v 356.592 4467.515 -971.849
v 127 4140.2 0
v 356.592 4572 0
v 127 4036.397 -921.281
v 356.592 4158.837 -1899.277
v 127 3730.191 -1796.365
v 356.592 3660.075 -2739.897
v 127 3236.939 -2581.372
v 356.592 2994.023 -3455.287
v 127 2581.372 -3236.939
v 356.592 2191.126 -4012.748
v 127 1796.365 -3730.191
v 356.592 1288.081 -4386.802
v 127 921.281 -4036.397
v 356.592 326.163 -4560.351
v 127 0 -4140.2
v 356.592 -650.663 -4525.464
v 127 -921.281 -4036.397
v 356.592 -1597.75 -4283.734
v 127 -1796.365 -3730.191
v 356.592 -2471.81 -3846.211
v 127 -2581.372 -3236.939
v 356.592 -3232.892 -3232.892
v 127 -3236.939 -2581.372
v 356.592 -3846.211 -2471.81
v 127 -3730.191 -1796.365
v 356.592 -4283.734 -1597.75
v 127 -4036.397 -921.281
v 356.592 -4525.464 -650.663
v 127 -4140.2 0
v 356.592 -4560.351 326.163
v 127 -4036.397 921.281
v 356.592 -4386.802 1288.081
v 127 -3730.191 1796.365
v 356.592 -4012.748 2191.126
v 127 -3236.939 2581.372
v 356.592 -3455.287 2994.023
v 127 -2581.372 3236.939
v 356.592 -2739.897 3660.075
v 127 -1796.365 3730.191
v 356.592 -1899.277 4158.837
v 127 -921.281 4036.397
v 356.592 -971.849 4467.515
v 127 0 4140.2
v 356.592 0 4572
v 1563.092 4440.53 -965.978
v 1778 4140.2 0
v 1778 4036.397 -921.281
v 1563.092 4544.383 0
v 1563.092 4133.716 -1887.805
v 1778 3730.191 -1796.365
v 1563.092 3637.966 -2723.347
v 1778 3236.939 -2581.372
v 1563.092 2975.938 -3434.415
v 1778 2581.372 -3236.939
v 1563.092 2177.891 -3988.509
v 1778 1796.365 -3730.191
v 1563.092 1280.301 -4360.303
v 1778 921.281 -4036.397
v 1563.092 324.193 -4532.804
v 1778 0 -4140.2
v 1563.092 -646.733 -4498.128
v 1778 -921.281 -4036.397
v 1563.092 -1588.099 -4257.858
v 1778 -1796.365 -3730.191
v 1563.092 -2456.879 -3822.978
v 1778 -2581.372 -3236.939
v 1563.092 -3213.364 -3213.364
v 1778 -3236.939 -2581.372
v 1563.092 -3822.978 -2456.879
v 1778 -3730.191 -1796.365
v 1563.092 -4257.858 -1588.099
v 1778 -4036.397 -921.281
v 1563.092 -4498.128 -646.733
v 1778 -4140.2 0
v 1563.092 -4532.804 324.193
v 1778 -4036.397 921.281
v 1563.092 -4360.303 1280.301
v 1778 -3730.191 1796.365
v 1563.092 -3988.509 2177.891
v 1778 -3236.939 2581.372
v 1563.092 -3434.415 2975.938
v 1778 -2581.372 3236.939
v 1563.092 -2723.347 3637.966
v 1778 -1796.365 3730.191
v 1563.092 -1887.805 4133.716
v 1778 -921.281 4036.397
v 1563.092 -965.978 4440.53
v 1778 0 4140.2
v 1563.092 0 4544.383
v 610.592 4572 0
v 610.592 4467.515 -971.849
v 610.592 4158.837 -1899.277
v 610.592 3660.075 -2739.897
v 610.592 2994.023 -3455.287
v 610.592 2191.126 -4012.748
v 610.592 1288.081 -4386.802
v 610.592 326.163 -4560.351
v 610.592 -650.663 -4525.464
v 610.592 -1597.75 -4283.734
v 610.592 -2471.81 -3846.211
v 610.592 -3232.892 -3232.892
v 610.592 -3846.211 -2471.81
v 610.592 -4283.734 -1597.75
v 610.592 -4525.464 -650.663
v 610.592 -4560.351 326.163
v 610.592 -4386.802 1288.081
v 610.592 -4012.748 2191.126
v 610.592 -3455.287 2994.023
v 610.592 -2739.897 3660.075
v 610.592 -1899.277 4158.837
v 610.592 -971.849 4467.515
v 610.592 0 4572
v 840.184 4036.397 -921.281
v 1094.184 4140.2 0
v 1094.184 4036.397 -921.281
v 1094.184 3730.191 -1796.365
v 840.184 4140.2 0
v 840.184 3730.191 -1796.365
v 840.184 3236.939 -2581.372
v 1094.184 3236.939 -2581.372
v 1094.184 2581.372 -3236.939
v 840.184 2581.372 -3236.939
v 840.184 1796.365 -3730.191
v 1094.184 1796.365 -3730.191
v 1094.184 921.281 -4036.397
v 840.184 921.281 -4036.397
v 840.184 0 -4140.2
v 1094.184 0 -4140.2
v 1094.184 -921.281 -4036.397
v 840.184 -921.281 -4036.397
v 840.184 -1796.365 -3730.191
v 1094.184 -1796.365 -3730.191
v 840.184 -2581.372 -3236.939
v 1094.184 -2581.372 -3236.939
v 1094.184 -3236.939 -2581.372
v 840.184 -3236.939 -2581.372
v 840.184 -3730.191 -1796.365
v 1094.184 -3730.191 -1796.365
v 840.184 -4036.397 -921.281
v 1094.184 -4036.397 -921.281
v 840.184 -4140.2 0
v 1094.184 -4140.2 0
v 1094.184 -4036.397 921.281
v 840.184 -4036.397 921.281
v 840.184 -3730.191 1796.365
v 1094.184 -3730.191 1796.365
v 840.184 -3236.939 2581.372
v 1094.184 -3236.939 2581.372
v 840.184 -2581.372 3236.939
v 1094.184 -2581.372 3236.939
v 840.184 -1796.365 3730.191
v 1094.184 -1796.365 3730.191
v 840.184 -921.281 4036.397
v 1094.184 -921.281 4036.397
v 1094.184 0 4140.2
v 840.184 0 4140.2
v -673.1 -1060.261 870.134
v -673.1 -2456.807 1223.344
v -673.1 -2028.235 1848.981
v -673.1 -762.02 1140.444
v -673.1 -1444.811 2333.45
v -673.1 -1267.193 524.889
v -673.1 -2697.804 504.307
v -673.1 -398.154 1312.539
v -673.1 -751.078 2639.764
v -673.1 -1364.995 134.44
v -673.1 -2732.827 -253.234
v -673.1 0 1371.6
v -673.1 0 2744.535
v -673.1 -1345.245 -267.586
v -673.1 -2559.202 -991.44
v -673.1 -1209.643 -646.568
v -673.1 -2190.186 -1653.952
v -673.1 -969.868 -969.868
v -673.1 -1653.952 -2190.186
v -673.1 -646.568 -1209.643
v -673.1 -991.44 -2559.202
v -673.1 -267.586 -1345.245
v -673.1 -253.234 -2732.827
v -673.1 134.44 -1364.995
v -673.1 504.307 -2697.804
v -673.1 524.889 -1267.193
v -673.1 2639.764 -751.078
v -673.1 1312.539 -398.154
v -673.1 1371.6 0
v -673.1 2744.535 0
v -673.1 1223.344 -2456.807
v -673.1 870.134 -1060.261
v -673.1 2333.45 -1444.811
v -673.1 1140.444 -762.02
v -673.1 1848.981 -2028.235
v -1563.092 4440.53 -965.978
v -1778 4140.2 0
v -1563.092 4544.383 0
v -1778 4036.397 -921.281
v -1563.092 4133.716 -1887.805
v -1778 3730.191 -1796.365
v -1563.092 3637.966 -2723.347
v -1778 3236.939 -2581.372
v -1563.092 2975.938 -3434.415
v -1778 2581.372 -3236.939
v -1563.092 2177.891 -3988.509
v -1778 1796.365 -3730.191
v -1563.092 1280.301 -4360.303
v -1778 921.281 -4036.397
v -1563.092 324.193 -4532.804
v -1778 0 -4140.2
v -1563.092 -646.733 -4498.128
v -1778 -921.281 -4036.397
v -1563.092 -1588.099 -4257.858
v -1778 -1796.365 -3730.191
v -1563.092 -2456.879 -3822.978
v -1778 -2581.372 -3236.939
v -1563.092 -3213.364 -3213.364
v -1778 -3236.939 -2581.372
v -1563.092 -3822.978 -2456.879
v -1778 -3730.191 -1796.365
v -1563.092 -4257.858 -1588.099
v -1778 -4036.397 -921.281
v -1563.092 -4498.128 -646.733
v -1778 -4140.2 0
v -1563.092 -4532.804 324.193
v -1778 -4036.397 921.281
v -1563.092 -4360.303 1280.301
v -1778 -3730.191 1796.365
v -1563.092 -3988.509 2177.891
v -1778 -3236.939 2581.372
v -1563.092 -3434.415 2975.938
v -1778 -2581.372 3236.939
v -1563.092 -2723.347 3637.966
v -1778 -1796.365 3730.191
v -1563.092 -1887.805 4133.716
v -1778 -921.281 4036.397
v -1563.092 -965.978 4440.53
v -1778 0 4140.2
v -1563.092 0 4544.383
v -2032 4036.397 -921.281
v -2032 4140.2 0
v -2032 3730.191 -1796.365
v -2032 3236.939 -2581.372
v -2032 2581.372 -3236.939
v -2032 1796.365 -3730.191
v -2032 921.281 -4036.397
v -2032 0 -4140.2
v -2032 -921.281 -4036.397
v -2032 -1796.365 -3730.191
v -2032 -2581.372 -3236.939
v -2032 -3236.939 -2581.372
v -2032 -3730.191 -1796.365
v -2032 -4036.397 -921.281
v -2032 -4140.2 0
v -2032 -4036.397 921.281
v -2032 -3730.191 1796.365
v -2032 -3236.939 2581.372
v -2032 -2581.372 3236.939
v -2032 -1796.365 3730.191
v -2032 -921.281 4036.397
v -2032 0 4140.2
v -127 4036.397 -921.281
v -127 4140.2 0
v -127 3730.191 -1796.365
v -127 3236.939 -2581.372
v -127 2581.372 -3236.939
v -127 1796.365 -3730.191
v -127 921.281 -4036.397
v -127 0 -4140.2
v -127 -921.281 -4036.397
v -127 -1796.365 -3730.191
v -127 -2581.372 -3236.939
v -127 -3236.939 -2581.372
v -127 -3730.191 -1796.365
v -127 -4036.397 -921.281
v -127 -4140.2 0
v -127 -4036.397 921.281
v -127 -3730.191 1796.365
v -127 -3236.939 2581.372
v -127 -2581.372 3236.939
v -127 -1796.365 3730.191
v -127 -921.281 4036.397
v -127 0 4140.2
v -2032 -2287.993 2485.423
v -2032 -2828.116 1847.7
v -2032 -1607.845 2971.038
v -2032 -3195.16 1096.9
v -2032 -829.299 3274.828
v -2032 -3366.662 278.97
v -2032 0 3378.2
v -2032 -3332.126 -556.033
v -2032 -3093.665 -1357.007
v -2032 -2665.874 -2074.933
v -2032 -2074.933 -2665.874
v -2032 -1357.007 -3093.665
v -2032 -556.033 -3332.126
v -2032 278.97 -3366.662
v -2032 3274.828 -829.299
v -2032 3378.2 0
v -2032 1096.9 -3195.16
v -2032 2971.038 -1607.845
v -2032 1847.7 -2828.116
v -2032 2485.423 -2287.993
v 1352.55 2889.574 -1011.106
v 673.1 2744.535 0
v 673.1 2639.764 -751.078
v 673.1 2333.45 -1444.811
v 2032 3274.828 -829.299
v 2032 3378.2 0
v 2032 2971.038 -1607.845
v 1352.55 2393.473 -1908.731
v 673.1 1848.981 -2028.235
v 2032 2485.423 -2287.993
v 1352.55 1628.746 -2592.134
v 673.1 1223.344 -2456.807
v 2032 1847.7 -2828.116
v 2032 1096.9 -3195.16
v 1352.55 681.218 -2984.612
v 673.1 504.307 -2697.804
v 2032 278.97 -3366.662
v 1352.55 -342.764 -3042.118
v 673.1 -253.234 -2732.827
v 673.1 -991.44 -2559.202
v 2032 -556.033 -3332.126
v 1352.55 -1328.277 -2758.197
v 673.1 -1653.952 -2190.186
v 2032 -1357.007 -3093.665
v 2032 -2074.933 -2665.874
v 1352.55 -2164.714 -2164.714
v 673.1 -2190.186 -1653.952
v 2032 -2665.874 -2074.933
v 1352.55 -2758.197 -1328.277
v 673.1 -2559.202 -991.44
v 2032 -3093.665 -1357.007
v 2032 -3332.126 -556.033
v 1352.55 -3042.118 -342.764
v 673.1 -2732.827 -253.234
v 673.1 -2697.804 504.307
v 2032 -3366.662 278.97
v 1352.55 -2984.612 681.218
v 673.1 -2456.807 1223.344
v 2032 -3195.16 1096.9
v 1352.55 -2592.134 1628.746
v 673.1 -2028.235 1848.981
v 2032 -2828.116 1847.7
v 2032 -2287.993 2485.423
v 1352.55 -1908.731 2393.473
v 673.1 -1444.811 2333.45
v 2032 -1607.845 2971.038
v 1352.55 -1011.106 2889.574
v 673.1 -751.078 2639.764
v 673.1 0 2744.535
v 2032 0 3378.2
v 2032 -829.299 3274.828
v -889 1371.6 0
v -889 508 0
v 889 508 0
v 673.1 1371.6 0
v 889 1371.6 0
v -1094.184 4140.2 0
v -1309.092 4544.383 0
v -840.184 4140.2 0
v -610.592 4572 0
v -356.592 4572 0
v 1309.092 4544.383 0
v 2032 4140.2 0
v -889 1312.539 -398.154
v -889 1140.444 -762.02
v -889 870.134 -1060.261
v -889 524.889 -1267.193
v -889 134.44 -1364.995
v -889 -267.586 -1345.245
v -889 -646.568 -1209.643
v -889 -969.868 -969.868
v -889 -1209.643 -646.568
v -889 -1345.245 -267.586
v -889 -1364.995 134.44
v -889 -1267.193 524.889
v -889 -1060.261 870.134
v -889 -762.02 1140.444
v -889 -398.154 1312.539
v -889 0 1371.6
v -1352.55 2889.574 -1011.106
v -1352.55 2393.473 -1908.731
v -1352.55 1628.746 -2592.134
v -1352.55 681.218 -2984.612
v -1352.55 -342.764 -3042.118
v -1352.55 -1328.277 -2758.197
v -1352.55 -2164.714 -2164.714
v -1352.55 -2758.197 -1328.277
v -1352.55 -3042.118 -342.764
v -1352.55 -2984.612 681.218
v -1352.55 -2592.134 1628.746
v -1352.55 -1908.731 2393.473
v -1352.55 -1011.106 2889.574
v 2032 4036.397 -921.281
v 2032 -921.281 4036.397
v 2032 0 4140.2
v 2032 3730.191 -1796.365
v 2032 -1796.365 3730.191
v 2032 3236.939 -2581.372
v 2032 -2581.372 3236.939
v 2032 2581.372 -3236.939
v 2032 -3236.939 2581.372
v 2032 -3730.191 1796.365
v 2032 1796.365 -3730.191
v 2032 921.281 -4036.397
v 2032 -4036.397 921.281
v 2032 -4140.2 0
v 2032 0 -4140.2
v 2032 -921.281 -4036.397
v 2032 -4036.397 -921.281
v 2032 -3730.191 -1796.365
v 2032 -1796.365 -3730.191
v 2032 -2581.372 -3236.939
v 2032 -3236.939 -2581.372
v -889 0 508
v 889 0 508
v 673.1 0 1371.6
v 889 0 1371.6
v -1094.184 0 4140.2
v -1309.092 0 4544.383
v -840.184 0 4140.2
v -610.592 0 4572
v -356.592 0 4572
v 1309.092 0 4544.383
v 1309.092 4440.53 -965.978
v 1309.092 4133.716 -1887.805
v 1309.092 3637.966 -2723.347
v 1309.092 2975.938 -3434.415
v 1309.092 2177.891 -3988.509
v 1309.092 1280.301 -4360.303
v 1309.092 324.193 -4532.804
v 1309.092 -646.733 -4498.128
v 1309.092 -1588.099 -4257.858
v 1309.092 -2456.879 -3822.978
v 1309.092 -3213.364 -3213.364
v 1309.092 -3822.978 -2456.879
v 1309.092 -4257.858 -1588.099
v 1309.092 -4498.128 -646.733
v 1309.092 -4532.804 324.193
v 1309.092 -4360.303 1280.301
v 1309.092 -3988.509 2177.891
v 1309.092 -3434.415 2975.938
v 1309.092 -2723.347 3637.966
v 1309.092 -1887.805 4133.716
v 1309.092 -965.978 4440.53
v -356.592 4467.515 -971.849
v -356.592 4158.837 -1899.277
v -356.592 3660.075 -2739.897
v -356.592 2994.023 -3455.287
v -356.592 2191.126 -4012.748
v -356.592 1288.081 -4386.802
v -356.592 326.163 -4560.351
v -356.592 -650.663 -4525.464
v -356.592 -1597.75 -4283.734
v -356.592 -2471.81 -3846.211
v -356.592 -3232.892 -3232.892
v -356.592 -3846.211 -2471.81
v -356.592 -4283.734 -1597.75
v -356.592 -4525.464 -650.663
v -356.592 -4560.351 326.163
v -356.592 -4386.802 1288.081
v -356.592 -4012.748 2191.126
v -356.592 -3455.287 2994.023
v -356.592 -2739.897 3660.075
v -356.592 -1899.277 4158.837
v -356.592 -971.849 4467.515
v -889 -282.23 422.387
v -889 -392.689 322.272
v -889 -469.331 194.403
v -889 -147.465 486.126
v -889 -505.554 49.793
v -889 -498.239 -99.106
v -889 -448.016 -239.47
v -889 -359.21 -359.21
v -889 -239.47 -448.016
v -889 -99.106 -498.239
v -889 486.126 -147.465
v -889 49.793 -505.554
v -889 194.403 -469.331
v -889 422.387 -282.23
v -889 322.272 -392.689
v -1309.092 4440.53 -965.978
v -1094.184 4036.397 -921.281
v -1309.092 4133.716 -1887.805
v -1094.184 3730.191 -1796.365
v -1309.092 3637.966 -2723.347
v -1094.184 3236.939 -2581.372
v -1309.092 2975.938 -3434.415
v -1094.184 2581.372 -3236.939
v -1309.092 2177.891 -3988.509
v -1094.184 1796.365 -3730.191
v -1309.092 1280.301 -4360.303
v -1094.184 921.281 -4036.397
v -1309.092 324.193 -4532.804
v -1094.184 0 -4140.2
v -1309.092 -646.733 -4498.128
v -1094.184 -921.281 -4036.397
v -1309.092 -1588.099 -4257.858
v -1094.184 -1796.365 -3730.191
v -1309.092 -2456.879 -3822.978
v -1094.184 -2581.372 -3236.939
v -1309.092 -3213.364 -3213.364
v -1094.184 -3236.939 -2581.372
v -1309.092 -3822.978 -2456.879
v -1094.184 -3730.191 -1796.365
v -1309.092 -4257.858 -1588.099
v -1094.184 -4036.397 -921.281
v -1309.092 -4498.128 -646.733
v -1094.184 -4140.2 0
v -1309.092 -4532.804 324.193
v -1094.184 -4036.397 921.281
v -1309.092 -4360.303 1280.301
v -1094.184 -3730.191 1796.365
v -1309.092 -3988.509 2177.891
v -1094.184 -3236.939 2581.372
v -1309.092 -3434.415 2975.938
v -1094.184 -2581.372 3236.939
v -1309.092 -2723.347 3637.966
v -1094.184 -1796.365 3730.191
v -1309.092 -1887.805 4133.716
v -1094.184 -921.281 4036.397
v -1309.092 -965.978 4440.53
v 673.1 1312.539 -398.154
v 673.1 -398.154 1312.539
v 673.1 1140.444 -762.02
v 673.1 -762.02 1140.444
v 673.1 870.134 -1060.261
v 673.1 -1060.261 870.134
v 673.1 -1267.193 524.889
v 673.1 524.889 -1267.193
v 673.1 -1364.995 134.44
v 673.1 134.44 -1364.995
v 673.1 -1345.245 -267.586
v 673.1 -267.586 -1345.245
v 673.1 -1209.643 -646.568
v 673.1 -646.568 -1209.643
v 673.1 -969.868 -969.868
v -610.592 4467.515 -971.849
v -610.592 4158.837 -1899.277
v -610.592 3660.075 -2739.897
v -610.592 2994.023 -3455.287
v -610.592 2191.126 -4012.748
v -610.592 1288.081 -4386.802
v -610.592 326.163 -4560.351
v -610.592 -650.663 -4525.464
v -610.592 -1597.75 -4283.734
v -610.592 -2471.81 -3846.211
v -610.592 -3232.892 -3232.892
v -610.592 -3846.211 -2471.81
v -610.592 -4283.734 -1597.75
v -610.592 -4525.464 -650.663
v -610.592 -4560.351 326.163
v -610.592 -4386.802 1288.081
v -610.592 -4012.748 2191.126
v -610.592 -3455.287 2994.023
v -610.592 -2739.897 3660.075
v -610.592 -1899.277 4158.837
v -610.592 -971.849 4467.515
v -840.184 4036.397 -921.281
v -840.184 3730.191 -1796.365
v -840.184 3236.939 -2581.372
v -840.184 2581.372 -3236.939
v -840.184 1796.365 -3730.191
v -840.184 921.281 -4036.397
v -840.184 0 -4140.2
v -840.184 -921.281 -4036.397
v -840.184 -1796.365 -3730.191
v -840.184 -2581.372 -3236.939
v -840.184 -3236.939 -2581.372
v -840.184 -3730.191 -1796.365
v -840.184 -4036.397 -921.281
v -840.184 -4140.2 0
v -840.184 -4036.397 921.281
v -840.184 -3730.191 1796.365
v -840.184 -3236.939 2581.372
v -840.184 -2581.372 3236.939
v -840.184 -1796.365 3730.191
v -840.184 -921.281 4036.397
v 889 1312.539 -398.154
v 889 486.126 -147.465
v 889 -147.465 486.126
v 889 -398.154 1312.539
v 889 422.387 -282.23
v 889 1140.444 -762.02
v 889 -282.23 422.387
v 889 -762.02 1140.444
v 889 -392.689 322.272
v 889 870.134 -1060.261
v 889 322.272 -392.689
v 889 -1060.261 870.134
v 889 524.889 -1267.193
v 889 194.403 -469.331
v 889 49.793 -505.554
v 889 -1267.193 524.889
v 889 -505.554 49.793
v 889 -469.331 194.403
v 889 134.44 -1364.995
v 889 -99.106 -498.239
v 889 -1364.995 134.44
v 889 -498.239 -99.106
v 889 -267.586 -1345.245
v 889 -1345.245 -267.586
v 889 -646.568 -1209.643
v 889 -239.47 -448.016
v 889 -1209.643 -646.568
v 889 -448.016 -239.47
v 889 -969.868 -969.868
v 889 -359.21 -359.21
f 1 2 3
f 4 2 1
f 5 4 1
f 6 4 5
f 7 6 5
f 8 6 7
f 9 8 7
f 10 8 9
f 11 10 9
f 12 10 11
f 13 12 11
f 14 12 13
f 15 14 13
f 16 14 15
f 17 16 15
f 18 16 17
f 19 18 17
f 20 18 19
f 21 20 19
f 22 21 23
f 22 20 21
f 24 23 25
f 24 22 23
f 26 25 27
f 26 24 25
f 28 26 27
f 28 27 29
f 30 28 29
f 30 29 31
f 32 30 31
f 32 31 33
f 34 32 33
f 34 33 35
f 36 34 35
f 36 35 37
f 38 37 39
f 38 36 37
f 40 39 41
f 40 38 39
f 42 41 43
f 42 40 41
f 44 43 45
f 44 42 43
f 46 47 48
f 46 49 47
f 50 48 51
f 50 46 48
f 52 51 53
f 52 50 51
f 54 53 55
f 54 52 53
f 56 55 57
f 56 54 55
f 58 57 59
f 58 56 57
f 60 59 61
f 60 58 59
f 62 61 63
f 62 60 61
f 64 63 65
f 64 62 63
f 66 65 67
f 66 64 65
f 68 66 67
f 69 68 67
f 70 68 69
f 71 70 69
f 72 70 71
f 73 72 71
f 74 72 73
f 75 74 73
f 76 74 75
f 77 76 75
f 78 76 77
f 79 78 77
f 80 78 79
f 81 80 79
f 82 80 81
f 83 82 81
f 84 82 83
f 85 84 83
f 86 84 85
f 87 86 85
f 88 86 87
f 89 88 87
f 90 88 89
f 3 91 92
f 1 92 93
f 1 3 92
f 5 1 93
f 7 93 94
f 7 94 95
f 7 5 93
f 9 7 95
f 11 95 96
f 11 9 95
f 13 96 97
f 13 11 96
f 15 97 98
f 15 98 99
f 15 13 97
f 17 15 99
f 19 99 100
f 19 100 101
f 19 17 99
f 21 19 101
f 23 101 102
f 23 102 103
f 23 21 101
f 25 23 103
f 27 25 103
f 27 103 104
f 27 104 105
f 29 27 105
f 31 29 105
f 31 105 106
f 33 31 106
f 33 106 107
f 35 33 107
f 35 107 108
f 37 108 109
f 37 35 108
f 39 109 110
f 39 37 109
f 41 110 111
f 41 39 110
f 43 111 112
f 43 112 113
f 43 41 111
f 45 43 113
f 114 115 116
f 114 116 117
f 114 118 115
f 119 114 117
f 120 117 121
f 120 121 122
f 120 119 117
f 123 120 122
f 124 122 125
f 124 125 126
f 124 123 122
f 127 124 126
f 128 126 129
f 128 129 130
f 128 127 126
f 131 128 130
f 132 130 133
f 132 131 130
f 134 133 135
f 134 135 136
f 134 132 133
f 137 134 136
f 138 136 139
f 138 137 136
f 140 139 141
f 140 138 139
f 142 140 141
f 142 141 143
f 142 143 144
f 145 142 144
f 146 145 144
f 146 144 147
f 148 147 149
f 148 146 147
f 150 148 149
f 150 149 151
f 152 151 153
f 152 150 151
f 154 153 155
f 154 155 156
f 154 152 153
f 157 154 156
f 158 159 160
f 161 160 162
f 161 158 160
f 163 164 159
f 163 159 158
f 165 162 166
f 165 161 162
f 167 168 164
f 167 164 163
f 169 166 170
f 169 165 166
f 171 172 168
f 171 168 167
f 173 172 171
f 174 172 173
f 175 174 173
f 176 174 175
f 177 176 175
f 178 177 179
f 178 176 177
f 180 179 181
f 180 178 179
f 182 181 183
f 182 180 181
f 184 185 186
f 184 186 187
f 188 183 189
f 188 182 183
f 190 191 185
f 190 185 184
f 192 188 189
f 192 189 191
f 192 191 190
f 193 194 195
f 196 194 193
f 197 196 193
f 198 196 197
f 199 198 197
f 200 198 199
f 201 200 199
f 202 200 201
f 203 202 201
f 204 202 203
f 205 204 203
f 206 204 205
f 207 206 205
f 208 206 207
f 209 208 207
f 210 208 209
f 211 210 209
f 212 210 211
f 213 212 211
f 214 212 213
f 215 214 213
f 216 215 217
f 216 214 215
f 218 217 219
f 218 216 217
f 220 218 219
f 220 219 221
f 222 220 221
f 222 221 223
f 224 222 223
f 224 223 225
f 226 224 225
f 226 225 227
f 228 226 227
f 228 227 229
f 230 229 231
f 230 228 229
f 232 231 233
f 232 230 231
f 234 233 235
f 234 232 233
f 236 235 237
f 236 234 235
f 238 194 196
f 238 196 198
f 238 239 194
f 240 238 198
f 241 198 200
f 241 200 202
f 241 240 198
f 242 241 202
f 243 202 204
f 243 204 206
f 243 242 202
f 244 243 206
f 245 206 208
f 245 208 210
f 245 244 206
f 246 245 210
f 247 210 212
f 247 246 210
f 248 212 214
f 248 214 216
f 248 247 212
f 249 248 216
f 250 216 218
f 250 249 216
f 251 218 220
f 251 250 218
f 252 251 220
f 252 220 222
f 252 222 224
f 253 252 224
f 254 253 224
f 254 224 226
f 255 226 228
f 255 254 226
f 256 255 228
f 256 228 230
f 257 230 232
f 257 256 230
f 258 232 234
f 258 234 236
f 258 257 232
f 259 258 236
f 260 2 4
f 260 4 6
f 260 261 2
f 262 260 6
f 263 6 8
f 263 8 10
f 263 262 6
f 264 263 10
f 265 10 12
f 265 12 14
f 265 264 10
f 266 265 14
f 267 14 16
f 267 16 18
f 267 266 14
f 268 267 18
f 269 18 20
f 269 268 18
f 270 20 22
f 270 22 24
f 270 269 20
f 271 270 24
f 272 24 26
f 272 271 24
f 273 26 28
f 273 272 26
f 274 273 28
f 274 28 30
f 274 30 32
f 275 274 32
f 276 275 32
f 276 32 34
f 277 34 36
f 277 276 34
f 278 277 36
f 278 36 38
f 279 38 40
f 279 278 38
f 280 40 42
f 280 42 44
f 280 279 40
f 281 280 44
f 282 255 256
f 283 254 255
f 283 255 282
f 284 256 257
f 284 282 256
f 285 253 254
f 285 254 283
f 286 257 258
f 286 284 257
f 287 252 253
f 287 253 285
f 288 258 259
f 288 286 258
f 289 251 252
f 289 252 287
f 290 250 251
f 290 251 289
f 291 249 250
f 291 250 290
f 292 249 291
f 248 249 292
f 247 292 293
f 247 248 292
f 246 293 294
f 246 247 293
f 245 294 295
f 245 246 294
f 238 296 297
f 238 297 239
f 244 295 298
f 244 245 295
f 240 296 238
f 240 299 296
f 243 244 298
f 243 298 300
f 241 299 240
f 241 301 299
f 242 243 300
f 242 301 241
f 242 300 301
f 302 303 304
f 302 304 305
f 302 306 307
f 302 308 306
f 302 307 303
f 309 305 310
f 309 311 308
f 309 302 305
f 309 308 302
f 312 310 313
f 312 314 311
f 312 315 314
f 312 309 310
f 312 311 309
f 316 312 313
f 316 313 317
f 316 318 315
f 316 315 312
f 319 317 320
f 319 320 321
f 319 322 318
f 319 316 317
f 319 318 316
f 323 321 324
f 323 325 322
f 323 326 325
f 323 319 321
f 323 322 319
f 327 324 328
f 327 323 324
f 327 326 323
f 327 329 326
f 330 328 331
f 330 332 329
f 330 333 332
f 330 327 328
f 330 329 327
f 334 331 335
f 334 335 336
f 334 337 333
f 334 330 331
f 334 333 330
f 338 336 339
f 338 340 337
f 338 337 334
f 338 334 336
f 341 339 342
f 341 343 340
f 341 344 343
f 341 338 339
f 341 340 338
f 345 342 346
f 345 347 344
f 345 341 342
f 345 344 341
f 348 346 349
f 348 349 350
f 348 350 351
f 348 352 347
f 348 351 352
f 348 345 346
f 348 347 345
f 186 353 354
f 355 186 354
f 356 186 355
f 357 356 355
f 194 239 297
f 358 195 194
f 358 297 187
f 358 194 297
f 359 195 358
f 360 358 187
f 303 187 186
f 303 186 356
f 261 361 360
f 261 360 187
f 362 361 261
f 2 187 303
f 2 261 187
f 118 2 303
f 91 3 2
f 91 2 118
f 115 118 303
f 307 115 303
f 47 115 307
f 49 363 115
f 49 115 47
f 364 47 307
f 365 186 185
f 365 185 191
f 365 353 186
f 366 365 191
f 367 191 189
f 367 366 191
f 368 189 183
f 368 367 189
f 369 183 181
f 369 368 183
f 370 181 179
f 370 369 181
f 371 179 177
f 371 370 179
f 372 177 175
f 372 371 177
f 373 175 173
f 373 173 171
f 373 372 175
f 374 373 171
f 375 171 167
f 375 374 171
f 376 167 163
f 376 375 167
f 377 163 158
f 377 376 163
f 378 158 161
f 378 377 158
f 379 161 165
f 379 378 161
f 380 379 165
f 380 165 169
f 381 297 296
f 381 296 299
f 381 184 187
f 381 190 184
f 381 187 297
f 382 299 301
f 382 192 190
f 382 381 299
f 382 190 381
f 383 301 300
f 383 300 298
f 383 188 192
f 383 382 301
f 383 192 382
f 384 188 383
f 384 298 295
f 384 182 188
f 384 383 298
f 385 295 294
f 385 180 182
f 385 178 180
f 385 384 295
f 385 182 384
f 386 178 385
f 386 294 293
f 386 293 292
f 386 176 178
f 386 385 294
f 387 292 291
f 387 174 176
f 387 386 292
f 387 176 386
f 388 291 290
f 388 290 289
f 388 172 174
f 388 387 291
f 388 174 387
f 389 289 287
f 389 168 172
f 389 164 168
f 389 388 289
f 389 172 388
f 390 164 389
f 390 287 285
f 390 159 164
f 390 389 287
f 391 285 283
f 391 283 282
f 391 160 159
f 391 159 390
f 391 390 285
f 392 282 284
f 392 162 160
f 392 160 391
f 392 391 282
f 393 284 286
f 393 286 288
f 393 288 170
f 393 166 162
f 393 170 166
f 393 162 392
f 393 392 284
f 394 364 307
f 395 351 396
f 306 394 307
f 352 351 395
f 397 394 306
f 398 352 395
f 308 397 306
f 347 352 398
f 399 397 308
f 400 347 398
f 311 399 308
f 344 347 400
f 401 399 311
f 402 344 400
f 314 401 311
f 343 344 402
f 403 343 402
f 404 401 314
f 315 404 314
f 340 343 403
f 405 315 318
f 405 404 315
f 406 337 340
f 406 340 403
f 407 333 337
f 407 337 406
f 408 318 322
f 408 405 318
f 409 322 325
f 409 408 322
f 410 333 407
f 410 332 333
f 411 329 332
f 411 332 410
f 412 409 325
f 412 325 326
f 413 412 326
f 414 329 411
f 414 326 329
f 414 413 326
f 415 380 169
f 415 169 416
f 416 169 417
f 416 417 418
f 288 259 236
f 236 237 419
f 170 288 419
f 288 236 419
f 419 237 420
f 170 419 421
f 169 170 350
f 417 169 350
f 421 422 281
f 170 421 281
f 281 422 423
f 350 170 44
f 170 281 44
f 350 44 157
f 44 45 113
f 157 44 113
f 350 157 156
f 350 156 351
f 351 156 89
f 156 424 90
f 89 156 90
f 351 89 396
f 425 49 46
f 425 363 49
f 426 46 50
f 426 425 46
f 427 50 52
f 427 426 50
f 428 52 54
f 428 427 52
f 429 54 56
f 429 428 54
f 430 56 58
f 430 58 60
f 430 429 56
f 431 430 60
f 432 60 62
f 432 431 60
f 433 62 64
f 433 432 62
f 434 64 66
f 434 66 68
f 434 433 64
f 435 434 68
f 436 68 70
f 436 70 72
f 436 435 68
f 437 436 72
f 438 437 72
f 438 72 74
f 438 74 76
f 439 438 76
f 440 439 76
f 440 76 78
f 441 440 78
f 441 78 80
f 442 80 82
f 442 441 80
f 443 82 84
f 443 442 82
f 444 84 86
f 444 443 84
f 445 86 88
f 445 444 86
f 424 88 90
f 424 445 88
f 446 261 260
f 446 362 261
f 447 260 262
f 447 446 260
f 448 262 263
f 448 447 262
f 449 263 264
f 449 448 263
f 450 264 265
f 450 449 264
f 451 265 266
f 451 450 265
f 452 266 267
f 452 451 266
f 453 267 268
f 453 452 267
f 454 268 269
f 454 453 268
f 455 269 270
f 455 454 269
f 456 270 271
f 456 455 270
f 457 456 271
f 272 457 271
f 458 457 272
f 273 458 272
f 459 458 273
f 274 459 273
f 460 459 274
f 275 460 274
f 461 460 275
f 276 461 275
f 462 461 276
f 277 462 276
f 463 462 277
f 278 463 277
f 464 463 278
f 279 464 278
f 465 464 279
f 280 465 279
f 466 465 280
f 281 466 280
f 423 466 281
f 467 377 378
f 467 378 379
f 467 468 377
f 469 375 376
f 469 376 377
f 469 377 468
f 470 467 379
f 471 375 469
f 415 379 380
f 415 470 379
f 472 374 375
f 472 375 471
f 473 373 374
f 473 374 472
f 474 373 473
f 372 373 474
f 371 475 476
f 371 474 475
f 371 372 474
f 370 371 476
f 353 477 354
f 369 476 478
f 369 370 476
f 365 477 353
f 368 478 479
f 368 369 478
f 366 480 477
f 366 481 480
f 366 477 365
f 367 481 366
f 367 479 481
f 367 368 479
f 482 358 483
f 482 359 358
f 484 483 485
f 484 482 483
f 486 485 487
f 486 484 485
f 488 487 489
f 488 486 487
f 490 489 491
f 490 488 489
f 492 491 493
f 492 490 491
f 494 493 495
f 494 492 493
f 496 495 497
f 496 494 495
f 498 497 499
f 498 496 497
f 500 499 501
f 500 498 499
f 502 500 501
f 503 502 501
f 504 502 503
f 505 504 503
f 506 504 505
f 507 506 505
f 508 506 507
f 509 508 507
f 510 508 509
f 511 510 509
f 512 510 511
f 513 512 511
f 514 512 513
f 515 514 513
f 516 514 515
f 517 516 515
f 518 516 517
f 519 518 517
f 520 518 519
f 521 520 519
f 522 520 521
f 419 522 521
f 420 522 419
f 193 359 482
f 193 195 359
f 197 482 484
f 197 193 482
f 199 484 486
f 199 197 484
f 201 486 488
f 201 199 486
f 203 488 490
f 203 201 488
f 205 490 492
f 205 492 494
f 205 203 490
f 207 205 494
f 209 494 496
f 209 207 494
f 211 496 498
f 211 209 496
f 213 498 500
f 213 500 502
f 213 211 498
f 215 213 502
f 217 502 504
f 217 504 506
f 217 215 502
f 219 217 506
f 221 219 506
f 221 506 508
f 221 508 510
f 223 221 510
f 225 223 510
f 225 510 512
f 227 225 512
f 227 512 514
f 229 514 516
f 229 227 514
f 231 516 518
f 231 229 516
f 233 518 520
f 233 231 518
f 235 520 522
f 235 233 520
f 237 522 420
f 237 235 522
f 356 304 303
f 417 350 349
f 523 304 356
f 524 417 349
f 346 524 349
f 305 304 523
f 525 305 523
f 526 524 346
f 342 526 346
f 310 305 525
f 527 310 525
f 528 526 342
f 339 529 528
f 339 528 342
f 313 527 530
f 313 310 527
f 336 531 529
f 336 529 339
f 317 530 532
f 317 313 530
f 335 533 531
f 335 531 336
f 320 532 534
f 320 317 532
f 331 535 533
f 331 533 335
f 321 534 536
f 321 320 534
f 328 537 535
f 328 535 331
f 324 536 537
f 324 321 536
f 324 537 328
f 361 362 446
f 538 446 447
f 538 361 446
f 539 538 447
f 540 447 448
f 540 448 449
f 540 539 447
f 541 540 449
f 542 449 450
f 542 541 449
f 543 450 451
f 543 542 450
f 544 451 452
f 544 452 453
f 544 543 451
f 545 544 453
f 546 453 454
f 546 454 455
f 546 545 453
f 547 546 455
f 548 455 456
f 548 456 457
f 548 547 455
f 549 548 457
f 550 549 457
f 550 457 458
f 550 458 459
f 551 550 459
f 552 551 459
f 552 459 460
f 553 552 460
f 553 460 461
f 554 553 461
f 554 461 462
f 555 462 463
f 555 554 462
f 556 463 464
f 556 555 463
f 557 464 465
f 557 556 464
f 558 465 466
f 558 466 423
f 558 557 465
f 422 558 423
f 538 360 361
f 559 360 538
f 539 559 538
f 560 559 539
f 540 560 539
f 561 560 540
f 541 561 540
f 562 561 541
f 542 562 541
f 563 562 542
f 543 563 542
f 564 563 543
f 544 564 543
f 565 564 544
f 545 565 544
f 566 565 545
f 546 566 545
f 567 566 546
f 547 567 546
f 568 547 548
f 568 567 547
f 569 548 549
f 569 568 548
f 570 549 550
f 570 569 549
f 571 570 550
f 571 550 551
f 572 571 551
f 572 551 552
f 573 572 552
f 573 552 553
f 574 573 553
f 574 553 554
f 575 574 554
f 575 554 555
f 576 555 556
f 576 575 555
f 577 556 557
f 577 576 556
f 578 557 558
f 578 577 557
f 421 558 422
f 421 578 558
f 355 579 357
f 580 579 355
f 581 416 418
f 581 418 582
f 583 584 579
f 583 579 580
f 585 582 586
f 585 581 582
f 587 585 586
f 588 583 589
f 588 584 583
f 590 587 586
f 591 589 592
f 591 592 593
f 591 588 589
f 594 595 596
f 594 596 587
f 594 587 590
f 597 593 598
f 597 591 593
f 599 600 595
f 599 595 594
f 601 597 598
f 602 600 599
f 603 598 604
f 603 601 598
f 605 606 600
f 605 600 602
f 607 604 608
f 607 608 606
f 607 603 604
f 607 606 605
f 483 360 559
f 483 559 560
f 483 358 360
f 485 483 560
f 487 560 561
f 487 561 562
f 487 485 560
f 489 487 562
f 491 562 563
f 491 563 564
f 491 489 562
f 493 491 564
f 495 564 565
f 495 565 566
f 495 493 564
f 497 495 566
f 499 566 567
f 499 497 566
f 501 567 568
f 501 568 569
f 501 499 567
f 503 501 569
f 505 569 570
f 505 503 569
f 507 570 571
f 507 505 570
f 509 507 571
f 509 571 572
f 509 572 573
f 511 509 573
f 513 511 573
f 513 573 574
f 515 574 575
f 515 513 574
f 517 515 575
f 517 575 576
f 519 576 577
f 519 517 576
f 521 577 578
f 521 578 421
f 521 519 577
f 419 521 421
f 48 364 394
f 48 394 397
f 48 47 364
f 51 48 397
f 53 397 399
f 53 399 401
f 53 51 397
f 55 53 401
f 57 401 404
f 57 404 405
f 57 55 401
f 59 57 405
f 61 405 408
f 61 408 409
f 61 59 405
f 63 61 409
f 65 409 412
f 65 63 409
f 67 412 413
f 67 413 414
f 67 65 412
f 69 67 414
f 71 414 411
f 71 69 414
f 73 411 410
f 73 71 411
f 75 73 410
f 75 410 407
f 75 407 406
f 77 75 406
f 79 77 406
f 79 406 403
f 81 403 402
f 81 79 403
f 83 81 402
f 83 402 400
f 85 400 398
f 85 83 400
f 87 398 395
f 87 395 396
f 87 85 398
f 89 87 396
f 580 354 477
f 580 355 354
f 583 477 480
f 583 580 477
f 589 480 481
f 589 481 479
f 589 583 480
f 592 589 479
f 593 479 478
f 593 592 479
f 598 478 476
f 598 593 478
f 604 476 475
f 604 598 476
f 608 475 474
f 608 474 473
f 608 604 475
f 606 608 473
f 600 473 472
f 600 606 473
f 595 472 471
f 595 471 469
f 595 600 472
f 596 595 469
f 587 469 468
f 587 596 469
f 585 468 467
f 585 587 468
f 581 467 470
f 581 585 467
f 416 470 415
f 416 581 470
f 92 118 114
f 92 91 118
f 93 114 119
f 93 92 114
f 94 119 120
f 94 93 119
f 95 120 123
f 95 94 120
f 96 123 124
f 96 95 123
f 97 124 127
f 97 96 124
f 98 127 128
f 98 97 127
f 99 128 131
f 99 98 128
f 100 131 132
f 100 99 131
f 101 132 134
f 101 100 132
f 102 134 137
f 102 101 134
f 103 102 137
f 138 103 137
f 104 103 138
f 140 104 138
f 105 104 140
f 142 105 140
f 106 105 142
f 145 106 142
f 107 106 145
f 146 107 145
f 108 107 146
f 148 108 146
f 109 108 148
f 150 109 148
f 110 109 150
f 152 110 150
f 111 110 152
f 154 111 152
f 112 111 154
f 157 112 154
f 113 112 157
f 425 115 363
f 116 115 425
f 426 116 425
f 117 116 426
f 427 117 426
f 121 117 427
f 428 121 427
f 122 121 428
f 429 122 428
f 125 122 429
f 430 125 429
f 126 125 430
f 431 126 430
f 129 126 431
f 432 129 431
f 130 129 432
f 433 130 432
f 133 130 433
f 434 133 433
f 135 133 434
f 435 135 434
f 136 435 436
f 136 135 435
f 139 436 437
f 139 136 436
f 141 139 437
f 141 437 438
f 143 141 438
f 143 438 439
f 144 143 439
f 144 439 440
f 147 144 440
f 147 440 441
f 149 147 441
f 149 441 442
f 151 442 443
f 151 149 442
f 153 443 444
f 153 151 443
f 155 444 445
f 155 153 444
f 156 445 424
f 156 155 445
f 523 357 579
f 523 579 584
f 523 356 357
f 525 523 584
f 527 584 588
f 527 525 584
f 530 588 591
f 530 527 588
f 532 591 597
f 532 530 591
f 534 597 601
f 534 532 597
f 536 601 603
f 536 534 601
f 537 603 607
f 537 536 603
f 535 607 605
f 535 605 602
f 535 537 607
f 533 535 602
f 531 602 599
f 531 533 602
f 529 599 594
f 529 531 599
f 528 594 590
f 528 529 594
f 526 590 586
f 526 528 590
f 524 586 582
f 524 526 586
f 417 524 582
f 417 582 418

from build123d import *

# Parameters (mm, degrees)
REVOLVE1_ANGLE = 270


with BuildPart() as part:
    # Sketch1 → Revolve1 (revolve)
    with BuildSketch(Plane.XY):
        Polygon((-889, 508), (889, 508), (889, 1371.6), (673.1, 1371.6), (673.1, 2744.534523333), (2032, 3378.2), (2032, 4140.2), (1778, 4140.2), (1563.092132591, 4544.382913846), (1309.092132591, 4544.382913846), (1094.184265183, 4140.2), (840.184265183, 4140.2), (610.592132591, 4572), (356.592132591, 4572), (127, 4140.2), (-127, 4140.2), (-356.592132591, 4572), (-610.592132591, 4572), (-840.184265183, 4140.2), (-1094.184265183, 4140.2), (-1309.092132591, 4544.382913846), (-1563.092132591, 4544.382913846), (-1778, 4140.2), (-2032, 4140.2), (-2032, 3378.2), (-673.1, 2744.534523333), (-673.1, 1371.6), (-889, 1371.6), align=None)
    revolve(axis=Axis((-2111.121296774, 0, 0), (-1, 0, 0)), revolution_arc=REVOLVE1_ANGLE)


solid = part.part
